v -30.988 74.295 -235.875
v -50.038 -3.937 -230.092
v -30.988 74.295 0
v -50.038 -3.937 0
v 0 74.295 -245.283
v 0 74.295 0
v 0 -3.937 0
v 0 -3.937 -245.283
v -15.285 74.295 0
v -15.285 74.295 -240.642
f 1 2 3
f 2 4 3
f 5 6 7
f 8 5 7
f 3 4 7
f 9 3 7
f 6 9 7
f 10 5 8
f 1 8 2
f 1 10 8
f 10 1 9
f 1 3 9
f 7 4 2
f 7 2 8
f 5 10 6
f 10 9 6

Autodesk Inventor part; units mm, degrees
ref_plane "YZ Plane" through (0, 0, 0) normal (1, 0, 0) x (0, 1, 0)
ref_plane "XZ Plane" through (0, 0, 0) normal (0, 1, 0) x (-1, 0, 0)
sketch "Sketch1" plane through (0, 0, 0) normal (0, 0, 1) x (1, 0, 0)
  line L0 (-812.8, -3.937) -> (0, -3.937) projected
  line L1 (-30.988, 74.295) -> (-15.2847, 74.295) projected
  line L2 (0, -3.937) -> (-50.038, -3.937)
  line L3 (-50.038, -3.937) -> (-30.988, 74.295)
  line L4 (-30.988, 74.295) -> (0, 74.295)
  line L5 (0, 74.295) -> (0, -3.937)
  line L6 (-50.038, -7.112) -> (-50.038, -3.937) projected
  point P0 (0, 0)
ref_plane "Work Plane1" through (-8.9942, -7.112, -242.5521) normal (-0.2905, 0, -0.9569) x (0, 1, 0)
extrude "Extrusion1" add sketch "Sketch1" against normal up to surface surface through (-8.9942, -7.112, -242.5521) normal (-0.2905, 0, -0.9569)
properties part number "FrontBumperFillA"
